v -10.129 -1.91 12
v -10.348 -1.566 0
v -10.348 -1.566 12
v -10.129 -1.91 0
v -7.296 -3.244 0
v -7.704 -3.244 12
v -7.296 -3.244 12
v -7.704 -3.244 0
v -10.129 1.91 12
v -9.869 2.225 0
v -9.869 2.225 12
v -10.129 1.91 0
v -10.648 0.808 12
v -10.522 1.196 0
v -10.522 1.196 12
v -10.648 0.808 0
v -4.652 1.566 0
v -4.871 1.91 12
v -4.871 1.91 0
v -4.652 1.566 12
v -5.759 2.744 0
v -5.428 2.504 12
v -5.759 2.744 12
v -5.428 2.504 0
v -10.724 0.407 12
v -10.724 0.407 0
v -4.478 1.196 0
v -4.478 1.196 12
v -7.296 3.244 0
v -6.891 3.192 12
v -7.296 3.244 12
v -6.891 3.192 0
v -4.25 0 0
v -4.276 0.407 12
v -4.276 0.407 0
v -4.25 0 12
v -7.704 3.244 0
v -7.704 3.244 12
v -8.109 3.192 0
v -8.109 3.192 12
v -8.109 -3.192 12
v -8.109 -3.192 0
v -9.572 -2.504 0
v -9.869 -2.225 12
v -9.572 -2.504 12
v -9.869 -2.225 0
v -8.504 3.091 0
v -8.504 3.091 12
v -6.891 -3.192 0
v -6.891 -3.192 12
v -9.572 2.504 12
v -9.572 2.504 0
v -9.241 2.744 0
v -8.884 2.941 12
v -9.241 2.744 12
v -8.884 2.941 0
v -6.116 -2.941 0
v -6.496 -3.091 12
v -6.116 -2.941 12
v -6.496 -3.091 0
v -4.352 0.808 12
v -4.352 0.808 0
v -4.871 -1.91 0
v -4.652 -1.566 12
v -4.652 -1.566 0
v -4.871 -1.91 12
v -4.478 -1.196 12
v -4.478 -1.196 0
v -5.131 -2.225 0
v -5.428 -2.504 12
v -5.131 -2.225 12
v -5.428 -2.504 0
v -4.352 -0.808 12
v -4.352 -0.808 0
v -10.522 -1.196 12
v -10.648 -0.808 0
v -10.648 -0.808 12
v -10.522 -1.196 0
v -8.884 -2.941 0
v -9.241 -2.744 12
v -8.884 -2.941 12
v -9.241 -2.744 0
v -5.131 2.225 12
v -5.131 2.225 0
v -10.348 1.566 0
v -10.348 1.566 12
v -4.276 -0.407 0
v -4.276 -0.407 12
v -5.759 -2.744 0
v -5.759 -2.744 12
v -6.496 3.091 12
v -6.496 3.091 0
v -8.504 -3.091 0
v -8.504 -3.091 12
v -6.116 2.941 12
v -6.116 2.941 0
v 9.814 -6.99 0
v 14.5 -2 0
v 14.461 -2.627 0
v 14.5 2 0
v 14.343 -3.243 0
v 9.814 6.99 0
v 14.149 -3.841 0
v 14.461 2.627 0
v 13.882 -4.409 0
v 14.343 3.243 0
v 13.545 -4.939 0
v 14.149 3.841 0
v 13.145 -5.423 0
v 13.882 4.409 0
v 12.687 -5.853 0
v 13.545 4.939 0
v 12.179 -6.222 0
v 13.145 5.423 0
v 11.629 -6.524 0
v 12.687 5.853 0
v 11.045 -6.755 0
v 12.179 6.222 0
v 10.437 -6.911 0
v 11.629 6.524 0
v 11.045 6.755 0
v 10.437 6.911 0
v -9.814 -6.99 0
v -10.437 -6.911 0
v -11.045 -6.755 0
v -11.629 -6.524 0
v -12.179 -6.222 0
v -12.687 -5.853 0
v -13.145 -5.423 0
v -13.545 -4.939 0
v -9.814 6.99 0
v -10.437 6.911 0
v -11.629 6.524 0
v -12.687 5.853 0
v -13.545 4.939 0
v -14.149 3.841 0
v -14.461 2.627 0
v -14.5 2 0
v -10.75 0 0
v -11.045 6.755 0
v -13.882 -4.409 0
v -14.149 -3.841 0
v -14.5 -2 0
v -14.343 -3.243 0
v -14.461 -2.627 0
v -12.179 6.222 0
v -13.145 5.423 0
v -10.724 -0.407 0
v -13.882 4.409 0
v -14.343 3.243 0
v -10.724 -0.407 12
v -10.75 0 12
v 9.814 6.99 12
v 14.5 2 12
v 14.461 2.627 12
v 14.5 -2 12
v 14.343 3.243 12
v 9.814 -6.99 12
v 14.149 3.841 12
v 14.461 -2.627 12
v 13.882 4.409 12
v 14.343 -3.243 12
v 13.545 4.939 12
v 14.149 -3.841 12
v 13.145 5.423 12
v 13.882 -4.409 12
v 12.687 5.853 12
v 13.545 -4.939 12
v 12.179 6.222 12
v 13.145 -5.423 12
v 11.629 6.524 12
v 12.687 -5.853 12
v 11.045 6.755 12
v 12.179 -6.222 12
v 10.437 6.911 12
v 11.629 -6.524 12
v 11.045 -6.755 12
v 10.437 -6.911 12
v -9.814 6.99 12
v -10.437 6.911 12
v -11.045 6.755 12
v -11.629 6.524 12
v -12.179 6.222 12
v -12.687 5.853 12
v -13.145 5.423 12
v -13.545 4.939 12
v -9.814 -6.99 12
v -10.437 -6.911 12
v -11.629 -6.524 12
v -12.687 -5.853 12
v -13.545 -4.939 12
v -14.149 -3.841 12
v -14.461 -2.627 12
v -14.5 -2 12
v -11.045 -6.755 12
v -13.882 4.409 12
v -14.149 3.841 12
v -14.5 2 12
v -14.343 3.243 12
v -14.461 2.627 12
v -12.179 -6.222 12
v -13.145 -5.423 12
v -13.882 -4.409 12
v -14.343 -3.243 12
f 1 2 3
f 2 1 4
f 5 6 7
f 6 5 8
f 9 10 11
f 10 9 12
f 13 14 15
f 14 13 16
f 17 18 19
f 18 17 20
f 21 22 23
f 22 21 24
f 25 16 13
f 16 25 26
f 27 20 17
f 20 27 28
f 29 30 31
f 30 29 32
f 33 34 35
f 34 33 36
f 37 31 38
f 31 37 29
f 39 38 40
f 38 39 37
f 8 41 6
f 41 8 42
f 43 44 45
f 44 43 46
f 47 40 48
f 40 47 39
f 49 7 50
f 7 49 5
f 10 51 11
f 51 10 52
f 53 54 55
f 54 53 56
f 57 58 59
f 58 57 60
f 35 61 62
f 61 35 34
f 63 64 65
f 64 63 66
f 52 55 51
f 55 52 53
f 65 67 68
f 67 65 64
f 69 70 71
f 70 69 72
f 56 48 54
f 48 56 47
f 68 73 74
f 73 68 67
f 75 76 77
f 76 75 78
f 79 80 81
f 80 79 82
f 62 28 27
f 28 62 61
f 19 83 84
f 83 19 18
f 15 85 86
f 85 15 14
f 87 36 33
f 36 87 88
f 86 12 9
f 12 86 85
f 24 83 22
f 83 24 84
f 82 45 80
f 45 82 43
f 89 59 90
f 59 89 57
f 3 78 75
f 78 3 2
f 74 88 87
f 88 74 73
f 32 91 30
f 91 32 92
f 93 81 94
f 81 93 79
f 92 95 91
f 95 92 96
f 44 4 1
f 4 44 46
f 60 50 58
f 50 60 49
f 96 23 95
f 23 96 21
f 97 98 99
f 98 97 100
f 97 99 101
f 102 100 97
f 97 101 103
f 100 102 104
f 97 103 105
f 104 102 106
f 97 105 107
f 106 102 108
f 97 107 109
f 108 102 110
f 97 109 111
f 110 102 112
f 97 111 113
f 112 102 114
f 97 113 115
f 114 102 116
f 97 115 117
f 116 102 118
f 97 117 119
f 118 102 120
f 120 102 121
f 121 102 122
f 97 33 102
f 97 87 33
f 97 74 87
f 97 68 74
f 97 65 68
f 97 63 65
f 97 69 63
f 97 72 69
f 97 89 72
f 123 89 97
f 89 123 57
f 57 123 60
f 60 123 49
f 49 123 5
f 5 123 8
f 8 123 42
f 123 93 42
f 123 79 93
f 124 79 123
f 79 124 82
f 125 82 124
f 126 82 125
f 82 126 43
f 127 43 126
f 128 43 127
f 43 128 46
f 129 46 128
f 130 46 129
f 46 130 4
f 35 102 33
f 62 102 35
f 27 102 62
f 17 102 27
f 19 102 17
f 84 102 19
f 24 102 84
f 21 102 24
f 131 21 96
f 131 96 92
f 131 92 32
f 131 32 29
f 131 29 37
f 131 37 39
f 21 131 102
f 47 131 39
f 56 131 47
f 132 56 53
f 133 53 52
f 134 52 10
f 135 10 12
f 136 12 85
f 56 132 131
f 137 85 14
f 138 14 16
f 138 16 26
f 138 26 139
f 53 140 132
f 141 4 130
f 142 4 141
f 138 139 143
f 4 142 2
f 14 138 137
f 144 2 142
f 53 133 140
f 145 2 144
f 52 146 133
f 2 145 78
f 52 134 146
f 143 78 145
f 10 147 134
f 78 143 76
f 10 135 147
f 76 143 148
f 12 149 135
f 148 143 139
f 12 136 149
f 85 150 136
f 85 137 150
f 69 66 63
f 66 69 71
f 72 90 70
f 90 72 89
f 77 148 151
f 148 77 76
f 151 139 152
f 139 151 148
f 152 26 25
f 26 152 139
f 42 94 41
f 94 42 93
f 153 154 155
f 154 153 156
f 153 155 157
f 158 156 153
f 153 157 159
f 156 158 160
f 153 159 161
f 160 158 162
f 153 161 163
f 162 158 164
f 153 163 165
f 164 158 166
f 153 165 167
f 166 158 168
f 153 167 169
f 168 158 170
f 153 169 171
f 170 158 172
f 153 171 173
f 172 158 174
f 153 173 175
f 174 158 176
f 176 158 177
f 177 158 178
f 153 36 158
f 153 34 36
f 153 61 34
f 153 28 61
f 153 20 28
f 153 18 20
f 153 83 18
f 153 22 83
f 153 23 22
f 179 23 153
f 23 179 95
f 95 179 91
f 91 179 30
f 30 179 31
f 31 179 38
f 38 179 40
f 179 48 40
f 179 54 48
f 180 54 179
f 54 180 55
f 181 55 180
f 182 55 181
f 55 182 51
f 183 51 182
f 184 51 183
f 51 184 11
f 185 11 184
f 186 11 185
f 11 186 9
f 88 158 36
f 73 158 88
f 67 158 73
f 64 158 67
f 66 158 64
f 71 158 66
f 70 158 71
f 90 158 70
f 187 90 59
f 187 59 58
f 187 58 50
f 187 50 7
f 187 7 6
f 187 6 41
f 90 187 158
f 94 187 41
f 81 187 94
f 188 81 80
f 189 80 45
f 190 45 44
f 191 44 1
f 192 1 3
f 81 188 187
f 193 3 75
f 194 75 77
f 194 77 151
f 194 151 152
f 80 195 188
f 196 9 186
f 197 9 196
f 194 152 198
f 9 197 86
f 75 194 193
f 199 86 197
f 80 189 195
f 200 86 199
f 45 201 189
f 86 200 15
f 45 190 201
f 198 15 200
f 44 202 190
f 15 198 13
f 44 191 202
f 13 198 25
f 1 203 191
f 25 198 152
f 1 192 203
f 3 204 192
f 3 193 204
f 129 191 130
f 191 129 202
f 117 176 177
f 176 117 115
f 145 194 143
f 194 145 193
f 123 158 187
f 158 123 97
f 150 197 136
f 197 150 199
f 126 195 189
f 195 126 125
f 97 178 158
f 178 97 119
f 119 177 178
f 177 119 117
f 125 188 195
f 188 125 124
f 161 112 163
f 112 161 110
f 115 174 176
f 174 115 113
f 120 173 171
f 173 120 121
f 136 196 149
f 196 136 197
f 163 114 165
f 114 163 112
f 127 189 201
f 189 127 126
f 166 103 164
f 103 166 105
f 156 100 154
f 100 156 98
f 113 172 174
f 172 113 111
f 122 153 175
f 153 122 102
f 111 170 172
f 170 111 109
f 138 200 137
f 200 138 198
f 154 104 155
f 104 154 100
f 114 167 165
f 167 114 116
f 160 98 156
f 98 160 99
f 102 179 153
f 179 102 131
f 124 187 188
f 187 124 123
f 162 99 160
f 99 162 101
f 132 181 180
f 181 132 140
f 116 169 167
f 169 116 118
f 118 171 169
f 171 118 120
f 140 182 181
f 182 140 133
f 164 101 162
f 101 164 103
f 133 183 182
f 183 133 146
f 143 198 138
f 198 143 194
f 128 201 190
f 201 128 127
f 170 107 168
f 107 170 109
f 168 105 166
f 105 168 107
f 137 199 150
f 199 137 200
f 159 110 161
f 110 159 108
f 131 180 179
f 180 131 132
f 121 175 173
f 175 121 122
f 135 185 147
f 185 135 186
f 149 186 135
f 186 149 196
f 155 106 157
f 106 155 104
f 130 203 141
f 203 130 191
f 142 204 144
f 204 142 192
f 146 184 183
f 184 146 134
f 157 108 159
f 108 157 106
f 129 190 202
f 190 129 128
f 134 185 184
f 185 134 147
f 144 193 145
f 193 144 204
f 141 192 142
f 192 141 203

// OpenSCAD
$fn = 50;


difference() {
	union() {
		hull() {
			translate(v = [-9.5000000000, 2.0000000000, 0]) {
				cylinder(h = 12, r = 5);
			}
			translate(v = [9.5000000000, 2.0000000000, 0]) {
				cylinder(h = 12, r = 5);
			}
			translate(v = [-9.5000000000, -2.0000000000, 0]) {
				cylinder(h = 12, r = 5);
			}
			translate(v = [9.5000000000, -2.0000000000, 0]) {
				cylinder(h = 12, r = 5);
			}
		}
	}
	union() {
		translate(v = [-7.5000000000, 0.0000000000, 0]) {
			cylinder(h = 12, r = 3.2500000000);
		}
		translate(v = [-7.5000000000, 0.0000000000, 0]) {
			cylinder(h = 12, r = 1.8000000000);
		}
		translate(v = [-7.5000000000, 0.0000000000, 0]) {
			cylinder(h = 12, r = 1.8000000000);
		}
		translate(v = [-7.5000000000, 0.0000000000, 0]) {
			cylinder(h = 12, r = 1.8000000000);
		}
	}
}
